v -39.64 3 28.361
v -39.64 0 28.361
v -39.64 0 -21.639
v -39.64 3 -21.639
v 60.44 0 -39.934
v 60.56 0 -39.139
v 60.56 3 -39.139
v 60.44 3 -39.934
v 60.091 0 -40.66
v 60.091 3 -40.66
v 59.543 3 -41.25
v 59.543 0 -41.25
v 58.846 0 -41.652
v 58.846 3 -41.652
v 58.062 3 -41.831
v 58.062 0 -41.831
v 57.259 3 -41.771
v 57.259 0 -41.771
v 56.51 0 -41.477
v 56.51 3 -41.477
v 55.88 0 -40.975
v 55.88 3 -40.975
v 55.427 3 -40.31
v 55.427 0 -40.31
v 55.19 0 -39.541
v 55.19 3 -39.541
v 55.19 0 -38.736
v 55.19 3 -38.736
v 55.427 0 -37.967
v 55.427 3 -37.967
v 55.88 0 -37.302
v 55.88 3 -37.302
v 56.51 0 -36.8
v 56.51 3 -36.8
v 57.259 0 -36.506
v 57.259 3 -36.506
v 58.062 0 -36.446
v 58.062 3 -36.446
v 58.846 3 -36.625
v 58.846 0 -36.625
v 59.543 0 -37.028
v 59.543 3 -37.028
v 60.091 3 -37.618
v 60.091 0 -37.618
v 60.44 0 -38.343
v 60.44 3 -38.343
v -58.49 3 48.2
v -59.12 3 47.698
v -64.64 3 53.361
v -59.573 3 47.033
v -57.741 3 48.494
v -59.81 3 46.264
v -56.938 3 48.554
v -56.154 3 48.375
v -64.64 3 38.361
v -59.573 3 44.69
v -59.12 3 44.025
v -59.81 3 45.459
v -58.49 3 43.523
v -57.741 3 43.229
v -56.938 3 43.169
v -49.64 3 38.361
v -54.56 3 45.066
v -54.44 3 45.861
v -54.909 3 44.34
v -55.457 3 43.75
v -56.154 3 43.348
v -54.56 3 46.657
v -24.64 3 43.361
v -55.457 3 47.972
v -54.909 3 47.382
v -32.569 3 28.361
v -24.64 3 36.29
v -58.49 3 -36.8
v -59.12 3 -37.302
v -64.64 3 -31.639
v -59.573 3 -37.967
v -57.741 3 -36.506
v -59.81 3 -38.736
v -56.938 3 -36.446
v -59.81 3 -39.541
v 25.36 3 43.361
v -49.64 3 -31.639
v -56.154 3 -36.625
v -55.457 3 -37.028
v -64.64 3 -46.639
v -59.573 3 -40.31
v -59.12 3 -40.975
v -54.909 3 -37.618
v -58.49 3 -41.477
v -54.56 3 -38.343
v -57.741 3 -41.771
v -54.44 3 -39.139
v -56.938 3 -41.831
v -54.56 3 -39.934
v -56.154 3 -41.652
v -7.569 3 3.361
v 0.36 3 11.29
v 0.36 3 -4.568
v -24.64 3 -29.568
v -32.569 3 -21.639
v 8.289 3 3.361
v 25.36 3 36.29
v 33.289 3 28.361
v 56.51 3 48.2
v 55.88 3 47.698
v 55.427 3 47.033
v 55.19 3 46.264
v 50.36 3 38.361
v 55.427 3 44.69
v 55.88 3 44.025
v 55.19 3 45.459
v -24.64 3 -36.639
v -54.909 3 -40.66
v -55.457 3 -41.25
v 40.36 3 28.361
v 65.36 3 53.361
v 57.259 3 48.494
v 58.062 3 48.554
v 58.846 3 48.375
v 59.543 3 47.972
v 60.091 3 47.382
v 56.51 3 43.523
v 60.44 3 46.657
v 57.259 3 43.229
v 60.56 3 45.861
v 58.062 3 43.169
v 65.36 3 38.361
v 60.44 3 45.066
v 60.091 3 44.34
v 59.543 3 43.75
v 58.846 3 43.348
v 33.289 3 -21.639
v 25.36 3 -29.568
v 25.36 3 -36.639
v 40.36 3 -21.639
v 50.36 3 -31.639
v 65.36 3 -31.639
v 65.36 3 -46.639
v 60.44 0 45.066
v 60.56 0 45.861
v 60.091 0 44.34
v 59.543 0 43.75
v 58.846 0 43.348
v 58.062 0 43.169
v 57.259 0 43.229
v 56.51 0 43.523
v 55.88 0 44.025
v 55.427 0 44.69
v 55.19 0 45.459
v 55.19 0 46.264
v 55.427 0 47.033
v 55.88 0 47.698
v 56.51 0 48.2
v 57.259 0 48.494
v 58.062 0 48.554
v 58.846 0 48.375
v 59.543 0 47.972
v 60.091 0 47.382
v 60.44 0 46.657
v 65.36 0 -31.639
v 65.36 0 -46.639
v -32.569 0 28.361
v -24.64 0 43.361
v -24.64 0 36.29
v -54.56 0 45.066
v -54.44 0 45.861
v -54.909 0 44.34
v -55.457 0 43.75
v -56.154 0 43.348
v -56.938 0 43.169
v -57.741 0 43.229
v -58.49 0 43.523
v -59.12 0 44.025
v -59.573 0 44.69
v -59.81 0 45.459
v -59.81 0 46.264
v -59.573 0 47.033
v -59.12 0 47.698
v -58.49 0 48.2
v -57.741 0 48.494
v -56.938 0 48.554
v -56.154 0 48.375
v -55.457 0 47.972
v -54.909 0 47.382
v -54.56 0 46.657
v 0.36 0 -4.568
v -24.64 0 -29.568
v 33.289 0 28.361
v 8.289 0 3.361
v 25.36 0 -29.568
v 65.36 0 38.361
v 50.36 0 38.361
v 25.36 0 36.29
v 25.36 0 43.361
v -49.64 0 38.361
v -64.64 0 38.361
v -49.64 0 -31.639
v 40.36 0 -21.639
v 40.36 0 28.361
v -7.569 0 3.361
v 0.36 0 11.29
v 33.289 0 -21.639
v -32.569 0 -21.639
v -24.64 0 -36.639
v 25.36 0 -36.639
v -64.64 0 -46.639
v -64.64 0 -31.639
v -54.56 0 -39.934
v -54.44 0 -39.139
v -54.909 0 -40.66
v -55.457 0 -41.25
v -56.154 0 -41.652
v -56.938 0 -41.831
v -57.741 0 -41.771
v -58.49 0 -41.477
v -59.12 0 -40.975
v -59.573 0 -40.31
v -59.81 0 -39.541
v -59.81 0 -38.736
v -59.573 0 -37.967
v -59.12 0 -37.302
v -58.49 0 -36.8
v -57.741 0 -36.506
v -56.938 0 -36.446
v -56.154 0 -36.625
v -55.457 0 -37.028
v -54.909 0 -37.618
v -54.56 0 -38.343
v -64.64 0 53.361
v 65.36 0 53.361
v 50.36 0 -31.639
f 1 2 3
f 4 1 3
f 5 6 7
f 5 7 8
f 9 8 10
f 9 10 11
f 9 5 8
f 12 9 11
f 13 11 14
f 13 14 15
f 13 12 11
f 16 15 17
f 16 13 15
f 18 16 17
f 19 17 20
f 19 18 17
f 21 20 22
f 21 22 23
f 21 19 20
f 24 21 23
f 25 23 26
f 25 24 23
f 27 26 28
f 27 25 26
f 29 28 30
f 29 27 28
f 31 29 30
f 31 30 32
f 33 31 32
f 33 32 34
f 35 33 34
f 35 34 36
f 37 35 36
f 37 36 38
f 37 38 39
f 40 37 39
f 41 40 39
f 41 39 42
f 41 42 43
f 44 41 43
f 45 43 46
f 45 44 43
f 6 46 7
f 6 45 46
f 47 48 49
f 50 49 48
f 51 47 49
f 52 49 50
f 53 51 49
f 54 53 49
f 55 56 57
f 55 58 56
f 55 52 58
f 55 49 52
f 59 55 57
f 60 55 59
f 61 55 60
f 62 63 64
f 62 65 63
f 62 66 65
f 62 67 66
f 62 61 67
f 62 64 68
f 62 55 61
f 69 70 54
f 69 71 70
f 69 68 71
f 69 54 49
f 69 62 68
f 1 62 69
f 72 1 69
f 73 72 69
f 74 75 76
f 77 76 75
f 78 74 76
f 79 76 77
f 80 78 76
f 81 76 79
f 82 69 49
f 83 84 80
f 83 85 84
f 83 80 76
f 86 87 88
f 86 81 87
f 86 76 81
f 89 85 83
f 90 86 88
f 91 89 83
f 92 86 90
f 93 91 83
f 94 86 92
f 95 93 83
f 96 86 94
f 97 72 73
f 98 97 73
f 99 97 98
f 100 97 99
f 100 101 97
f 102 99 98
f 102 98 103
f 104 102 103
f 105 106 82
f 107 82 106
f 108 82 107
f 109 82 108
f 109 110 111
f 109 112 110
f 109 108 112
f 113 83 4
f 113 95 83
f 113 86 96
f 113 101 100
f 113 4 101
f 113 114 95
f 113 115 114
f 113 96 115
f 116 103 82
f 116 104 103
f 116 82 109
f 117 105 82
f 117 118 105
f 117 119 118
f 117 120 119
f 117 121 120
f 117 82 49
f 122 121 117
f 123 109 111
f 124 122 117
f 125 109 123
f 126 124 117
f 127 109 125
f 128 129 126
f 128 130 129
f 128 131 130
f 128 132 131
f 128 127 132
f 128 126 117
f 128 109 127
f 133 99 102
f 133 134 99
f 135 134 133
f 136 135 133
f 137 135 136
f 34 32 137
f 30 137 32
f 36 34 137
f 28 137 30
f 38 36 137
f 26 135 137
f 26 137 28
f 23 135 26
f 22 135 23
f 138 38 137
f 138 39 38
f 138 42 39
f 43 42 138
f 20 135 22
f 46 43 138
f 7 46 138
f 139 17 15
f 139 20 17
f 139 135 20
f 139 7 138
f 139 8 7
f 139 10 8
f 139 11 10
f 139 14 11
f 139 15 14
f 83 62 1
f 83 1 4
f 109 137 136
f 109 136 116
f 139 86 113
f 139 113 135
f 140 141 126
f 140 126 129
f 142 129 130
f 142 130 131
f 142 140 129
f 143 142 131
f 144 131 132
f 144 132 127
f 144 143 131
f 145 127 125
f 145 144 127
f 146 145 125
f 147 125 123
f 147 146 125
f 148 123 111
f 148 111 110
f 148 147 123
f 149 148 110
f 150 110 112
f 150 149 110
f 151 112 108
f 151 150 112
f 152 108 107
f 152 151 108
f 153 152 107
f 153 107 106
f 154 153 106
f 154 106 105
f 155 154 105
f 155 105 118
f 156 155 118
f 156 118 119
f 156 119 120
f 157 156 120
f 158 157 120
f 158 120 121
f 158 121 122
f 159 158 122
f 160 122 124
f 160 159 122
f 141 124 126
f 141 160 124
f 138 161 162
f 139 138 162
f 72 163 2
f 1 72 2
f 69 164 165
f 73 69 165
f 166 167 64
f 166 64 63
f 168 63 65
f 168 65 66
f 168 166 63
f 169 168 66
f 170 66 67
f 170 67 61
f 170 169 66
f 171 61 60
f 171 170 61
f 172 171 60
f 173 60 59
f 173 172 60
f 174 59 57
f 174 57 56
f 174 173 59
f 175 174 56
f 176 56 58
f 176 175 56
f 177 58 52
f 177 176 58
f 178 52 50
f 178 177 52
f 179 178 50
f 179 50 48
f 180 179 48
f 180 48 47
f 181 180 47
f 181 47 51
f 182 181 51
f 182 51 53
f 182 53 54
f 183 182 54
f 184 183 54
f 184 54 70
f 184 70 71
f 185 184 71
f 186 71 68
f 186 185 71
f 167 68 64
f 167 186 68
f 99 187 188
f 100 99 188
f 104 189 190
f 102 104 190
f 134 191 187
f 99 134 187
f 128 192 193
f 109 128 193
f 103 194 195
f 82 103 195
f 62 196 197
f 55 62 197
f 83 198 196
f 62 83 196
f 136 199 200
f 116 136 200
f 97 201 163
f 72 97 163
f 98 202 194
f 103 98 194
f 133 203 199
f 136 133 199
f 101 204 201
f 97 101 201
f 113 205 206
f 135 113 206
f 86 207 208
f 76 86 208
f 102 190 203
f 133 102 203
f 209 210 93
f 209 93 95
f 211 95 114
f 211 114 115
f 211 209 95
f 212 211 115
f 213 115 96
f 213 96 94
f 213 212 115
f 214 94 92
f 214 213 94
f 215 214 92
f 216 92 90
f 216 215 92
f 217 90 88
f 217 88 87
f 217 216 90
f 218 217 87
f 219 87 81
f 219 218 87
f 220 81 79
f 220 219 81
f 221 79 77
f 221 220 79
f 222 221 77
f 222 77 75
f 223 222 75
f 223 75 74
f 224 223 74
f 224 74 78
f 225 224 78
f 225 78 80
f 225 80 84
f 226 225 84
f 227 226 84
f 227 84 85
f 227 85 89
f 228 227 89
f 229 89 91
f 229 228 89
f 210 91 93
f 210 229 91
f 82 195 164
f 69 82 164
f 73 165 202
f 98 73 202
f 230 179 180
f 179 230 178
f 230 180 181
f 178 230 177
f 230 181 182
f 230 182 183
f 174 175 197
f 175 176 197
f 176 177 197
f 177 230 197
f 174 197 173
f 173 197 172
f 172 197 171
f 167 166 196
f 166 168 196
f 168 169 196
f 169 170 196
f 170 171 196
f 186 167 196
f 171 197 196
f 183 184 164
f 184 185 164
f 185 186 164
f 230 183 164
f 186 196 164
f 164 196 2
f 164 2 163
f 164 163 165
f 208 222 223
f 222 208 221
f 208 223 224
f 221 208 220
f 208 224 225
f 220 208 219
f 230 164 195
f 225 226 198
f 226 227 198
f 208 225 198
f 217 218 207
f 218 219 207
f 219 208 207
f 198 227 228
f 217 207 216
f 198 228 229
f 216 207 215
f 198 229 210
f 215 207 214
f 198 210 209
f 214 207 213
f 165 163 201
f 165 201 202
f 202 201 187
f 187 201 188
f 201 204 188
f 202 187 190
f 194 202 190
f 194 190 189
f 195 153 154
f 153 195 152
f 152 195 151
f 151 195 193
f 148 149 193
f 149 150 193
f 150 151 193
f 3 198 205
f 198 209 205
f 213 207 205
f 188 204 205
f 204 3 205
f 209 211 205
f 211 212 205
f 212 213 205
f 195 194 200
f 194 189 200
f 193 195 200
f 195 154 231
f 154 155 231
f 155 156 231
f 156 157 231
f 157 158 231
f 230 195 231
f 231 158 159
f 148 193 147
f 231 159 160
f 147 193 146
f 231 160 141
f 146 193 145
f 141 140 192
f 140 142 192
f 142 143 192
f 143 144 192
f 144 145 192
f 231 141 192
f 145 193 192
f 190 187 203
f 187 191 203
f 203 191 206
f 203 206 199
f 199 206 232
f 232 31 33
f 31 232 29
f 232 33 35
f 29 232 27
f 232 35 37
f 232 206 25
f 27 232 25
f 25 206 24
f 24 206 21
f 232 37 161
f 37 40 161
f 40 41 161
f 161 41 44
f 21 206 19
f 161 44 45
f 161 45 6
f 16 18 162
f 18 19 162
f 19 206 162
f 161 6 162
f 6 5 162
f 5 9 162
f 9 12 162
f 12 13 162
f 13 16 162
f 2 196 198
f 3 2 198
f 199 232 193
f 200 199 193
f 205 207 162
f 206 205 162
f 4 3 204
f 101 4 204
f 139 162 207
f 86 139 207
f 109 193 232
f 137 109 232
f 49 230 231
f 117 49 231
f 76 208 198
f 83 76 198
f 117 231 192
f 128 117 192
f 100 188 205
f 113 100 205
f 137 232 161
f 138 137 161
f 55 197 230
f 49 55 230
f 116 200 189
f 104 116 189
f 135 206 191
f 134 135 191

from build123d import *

# Parameters (mm, degrees)
SKETCH2_R           = 2.7
BOSS_EXTRUDE2_DEPTH = 3


with BuildPart() as part:
    # Sketch2 → Boss-Extrude2 (new body)
    with BuildSketch(Plane(origin=(0, 0, 0), x_dir=(1, 0, 0), z_dir=(0, 1, 0))):
        Polygon((50.359735974, 46.638609582), (-49.640264026, 46.638609582), (-64.640264026, 46.638609582), (-64.640264026, 31.638609582), (-49.640264026, 31.638609582), (-49.640264026, -38.361390418), (-64.640264026, -38.361390418), (-64.640264026, -53.361390418), (-49.640264026, -53.361390418), (50.359735974, -53.361390418), (65.359735974, -53.361390418), (65.359735974, -38.361390418), (50.359735974, -38.361390418), (50.359735974, 31.638609582), (65.359735974, 31.638609582), (65.359735974, 46.638609582), align=None)
        with Locations((-57.140264026, -45.861390418)):
            Circle(SKETCH2_R, mode=Mode.SUBTRACT)
        Polygon((25.359735974, -43.361390418), (-24.640264026, -43.361390418), (-24.640264026, -36.290322606), (0.359735974, -11.290322606), (25.359735974, -36.290322606), align=None, mode=Mode.SUBTRACT)
        with Locations((57.859735974, -45.861390418)):
            Circle(SKETCH2_R, mode=Mode.SUBTRACT)
        Polygon((-39.640264026, -28.361390418), (-39.640264026, 21.638609582), (-32.569196215, 21.638609582), (-7.569196215, -3.361390418), (-32.569196215, -28.361390418), align=None, mode=Mode.SUBTRACT)
        Polygon((-24.640264026, 29.56754177), (-24.640264026, 36.638609582), (25.359735974, 36.638609582), (25.359735974, 29.56754177), (0.359735974, 4.56754177), align=None, mode=Mode.SUBTRACT)
        with Locations((-57.140264026, 39.138609582)):
            Circle(SKETCH2_R, mode=Mode.SUBTRACT)
        Polygon((33.288668162, 21.638609582), (40.359735974, 21.638609582), (40.359735974, -28.361390418), (33.288668162, -28.361390418), (8.288668162, -3.361390418), align=None, mode=Mode.SUBTRACT)
        with Locations((57.859735974, 39.138609582)):
            Circle(SKETCH2_R, mode=Mode.SUBTRACT)
    extrude(amount=BOSS_EXTRUDE2_DEPTH)


solid = part.part
